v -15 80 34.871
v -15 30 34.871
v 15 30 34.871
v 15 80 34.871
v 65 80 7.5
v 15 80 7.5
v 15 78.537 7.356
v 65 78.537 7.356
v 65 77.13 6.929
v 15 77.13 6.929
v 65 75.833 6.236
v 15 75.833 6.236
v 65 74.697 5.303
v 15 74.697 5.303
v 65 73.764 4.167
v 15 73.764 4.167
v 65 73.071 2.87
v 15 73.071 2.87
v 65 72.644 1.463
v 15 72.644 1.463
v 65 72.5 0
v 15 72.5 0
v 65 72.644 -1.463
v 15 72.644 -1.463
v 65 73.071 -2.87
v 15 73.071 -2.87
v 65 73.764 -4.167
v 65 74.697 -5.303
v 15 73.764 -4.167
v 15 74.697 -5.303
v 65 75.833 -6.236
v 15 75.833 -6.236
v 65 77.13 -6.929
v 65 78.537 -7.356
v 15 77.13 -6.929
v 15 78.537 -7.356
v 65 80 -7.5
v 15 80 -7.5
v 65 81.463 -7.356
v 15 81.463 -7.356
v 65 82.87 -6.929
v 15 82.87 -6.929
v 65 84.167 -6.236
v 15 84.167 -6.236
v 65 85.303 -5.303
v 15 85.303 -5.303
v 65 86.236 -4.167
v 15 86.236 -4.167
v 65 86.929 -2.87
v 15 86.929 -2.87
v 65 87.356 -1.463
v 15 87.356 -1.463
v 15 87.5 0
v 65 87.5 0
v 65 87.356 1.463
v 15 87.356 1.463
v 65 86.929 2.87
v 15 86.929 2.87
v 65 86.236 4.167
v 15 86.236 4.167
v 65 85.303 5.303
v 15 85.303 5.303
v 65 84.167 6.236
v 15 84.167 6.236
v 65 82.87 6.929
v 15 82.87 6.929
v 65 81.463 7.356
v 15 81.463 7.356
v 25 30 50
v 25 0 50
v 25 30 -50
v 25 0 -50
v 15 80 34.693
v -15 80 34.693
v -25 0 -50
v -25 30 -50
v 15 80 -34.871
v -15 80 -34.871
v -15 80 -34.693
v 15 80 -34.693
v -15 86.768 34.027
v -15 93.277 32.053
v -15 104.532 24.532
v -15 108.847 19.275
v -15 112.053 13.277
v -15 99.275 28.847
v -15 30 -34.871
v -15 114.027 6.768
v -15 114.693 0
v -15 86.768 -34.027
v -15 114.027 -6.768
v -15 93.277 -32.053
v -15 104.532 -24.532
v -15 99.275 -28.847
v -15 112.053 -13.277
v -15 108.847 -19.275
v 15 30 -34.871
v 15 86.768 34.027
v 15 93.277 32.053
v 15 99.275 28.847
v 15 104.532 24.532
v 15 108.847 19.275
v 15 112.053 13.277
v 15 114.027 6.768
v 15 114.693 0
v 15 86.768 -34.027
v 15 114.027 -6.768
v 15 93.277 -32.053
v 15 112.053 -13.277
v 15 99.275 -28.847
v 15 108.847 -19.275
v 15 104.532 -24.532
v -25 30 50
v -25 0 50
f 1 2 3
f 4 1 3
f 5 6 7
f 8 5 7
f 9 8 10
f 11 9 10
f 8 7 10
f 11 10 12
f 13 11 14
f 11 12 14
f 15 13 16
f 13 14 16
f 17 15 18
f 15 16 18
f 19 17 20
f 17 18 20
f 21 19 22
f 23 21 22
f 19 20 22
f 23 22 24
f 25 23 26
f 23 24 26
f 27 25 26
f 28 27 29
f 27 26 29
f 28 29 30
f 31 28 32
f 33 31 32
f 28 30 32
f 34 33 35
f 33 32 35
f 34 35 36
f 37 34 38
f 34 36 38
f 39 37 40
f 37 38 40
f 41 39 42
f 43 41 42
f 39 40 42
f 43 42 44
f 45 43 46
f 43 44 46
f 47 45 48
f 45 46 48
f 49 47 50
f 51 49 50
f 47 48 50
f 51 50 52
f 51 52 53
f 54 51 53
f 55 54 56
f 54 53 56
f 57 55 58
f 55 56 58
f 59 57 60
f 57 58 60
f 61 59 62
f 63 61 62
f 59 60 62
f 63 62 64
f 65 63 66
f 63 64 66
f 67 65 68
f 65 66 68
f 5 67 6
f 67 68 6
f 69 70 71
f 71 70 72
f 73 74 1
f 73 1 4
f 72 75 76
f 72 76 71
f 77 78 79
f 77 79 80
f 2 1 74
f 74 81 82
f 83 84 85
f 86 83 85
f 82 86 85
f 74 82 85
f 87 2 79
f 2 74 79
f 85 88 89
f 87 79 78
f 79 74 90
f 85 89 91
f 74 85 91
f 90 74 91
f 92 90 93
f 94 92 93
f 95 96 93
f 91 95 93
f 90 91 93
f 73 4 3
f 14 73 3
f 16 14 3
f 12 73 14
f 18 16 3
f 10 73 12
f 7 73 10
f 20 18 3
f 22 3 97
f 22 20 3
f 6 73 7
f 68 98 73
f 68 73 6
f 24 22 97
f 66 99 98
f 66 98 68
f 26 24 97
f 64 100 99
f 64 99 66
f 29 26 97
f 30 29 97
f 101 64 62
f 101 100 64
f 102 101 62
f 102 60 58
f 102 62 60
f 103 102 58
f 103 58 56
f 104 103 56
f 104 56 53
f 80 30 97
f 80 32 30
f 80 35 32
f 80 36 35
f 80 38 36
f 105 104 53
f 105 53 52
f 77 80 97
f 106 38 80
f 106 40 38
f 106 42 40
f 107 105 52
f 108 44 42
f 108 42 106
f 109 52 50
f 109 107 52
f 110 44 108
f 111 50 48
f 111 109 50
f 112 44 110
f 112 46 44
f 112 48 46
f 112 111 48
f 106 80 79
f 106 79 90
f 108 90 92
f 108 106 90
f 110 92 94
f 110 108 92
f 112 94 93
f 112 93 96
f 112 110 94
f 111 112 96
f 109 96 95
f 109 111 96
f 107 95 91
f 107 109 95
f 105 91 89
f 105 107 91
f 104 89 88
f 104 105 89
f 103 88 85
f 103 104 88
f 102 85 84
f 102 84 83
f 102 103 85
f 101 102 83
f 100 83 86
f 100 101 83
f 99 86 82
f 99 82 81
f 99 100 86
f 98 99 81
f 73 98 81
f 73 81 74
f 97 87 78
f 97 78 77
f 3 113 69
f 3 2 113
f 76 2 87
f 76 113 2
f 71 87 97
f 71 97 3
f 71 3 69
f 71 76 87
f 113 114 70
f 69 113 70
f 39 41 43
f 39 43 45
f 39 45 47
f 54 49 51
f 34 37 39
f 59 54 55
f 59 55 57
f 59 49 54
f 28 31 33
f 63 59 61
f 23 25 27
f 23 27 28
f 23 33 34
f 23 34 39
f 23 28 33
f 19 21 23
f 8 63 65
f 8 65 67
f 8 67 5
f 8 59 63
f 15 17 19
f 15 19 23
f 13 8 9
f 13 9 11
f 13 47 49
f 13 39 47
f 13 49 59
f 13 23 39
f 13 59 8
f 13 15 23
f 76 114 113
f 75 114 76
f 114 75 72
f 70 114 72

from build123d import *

# Parameters (mm, degrees)
SKETCH1_W           = 50
SKETCH1_H           = 100
BOSS_EXTRUDE1_DEPTH = 30
SKETCH3_W           = 30
SKETCH3_H           = 69.741989622
BOSS_EXTRUDE2_DEPTH = 50
SKETCH4_R           = 34.693390841
BOSS_EXTRUDE3_DEPTH = 30
SKETCH6_R           = 7.5
BOSS_EXTRUDE4_DEPTH = 50


with BuildPart() as part:
    # Sketch1 → Boss-Extrude1 (new body)
    with BuildSketch(Plane(origin=(0, 0, 0), x_dir=(1, 0, 0), z_dir=(0, 1, 0))):
        Rectangle(SKETCH1_W, SKETCH1_H)
    extrude(amount=BOSS_EXTRUDE1_DEPTH)

    # Sketch3 → Boss-Extrude2 (add)
    with BuildSketch(Plane(origin=(0, 30, 0), x_dir=(1, 0, 0), z_dir=(0, 1, 0))):
        Rectangle(SKETCH3_W, SKETCH3_H)
    extrude(amount=BOSS_EXTRUDE2_DEPTH)

    # Sketch4 → Boss-Extrude3 (add)
    with BuildSketch(Plane(origin=(15, 0, 0), x_dir=(0, 0, -1), z_dir=(1, 0, 0))):
        with Locations((0, 80)):
            Circle(SKETCH4_R)
    extrude(amount=-BOSS_EXTRUDE3_DEPTH)

    # Sketch6 → Boss-Extrude4 (add)
    with BuildSketch(Plane(origin=(15, 0, 0), x_dir=(0, 0, -1), z_dir=(1, 0, 0))):
        with Locations(Location((0, 80, 0), (0, 0, 180))):
            Circle(SKETCH6_R)
    extrude(amount=BOSS_EXTRUDE4_DEPTH)


solid = part.part
